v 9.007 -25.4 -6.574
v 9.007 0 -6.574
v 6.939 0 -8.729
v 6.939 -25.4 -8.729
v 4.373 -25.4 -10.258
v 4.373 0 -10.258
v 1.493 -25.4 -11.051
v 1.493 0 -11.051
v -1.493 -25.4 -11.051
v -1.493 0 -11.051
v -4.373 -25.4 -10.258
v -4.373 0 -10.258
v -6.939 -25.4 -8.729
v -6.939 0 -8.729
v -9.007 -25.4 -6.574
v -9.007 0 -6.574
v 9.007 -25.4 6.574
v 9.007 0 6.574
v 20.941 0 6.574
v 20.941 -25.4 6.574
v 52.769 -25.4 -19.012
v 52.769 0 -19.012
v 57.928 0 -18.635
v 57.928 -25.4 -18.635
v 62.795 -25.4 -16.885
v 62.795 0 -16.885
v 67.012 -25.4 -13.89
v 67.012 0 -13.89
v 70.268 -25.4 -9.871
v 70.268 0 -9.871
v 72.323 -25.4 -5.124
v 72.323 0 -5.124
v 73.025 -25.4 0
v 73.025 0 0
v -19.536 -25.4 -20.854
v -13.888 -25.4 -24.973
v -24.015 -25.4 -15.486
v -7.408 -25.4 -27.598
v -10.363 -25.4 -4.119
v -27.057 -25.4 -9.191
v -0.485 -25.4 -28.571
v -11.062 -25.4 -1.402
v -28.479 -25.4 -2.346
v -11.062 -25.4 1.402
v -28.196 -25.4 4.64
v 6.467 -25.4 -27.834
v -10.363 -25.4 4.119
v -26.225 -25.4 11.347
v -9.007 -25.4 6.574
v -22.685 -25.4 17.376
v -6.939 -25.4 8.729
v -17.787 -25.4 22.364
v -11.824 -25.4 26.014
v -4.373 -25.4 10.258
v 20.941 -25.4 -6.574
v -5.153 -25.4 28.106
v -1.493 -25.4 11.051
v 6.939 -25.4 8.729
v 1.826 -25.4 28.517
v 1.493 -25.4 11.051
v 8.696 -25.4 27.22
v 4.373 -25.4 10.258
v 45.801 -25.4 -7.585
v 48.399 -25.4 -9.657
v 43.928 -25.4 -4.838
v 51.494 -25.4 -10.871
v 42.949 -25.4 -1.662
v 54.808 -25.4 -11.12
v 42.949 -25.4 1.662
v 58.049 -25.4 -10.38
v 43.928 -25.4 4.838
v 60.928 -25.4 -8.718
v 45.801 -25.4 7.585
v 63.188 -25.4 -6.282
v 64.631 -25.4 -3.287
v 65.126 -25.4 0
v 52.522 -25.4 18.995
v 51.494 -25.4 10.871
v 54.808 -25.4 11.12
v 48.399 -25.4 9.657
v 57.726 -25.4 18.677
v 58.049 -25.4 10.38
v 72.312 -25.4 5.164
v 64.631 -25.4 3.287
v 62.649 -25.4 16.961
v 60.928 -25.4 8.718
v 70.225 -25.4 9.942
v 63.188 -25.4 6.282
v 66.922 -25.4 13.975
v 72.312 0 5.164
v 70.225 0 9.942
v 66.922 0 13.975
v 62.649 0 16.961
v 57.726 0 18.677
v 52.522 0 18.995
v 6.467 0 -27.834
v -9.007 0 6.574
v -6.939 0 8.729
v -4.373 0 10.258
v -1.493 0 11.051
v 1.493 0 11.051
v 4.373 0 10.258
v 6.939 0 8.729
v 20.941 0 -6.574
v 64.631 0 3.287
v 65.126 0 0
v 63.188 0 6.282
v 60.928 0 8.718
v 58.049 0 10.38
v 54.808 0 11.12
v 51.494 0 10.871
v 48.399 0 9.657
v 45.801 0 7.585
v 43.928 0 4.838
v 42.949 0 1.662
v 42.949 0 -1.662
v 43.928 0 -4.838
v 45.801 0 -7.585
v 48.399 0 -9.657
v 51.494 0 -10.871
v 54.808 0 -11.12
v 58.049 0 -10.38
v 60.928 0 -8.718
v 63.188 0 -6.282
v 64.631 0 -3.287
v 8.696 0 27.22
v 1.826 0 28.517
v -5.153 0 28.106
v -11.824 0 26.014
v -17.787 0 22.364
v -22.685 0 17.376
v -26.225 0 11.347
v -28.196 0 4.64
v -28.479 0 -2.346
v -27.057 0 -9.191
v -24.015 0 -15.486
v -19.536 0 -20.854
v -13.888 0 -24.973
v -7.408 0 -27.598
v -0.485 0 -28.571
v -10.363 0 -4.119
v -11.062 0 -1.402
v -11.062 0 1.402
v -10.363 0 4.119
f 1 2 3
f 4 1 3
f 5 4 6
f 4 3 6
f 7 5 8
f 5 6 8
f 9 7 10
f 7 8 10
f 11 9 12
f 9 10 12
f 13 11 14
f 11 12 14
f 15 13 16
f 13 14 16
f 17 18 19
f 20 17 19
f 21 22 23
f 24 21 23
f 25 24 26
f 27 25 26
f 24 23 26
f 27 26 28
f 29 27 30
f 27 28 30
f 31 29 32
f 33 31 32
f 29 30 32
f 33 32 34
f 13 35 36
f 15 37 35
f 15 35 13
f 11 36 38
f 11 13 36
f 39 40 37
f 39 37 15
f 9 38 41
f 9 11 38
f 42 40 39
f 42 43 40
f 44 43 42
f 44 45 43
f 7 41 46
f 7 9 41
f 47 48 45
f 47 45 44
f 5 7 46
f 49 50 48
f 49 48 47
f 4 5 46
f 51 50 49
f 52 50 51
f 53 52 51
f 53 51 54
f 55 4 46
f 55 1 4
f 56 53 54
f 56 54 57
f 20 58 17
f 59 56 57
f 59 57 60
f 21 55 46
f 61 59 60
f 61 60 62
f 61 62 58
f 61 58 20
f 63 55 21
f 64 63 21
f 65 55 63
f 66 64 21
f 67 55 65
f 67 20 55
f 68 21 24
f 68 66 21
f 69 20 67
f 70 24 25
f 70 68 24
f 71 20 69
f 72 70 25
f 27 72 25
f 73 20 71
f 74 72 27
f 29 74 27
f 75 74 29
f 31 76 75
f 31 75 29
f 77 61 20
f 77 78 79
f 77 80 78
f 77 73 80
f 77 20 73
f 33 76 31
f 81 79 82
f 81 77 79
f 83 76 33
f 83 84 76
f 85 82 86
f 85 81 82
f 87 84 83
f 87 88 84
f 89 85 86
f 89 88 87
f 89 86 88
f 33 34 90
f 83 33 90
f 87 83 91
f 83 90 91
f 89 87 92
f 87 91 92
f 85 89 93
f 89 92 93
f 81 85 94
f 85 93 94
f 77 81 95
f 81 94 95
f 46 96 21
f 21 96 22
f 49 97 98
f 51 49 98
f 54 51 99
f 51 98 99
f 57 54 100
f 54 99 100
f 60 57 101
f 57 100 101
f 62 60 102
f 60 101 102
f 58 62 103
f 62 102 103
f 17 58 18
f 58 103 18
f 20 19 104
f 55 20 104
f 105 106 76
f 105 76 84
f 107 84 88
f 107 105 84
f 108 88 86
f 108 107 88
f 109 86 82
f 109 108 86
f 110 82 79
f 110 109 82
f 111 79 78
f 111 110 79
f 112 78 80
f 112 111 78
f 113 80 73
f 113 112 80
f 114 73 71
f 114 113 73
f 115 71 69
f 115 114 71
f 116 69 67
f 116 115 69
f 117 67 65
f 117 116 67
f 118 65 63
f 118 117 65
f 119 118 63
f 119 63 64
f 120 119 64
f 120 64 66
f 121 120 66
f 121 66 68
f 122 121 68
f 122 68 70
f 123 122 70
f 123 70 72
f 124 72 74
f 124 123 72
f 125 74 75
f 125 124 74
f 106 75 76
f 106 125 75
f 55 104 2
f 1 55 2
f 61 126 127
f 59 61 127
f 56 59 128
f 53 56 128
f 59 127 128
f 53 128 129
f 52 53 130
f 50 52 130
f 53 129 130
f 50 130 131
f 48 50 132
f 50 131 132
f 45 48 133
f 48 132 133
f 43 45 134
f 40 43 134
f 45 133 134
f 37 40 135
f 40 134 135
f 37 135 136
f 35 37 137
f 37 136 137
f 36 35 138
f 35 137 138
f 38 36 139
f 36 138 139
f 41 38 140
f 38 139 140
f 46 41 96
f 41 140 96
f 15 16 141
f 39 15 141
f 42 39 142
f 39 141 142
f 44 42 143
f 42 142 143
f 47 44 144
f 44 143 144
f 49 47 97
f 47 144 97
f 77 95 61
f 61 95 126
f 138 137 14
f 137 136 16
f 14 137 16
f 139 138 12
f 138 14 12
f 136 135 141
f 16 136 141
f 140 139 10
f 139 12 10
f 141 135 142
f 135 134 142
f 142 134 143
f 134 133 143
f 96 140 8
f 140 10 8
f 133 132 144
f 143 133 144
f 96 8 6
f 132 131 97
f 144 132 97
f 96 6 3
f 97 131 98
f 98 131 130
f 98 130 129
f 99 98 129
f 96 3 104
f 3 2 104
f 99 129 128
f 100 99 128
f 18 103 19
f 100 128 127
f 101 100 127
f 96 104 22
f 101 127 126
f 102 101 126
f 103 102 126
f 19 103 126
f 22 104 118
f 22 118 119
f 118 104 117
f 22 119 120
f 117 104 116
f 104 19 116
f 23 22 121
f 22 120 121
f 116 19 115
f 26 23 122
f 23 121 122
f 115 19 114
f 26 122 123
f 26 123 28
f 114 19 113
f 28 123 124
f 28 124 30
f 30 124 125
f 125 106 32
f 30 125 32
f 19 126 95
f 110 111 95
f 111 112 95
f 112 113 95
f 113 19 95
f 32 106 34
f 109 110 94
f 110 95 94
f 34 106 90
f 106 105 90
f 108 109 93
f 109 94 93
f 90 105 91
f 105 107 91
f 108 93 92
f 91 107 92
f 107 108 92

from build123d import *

# Parameters (mm, degrees)
F0_R     = 11.151047
F1_DEPTH = 25.4


with BuildPart() as f1:
    # F0 (on Front) → F1 (new body)
    with BuildSketch(Plane.XZ):
        with BuildLine():
            ThreePointArc((6.467178, -27.833545), (22.375547, -17.772605), (28.575, 0))
            ThreePointArc((28.575, 0), (23.076019, 16.853129), (8.695527, 27.219817))
            ThreePointArc((8.695527, 27.219817), (-28.551621, 1.15566), (6.467178, -27.833545))
        make_face()
        with BuildLine():
            ThreePointArc((-9.006877, 6.574345), (0, 11.151047), (9.006877, 6.574345))
            Line((9.006877, 6.574345), (20.940501, 6.574345))
            Line((20.940501, 6.574345), (20.940501, -6.574345))
            Line((20.940501, -6.574345), (9.006877, -6.574345))
            ThreePointArc((9.006877, -6.574345), (0, -11.151047), (-9.006877, -6.574345))
            Line((-9.006877, -6.574345), (-20.940501, -6.574345))
            Line((-20.940501, -6.574345), (-20.940501, 6.574345))
            Line((-20.940501, 6.574345), (-9.006877, 6.574345))
        make_face(mode=Mode.SUBTRACT)
        with BuildLine():
            ThreePointArc((-9.006877, -6.574345), (-11.151047, 0), (-9.006877, 6.574345))
            Line((-9.006877, 6.574345), (-20.940501, 6.574345))
            Line((-20.940501, 6.574345), (-20.940501, -6.574345))
            Line((-20.940501, -6.574345), (-9.006877, -6.574345))
        make_face()
        with BuildLine():
            ThreePointArc((8.695527, 27.219817), (23.076019, 16.853129), (28.575, 0))
            ThreePointArc((28.575, 0), (22.375547, -17.772605), (6.467178, -27.833545))
            Line((6.467178, -27.833545), (52.769401, -19.011813))
            ThreePointArc((52.769401, -19.011813), (34.925403, -0.123852), (52.522301, 18.99453))
            Line((52.522301, 18.99453), (8.695527, 27.219817))
        make_face()
        with BuildLine():
            ThreePointArc((73.025, 0), (66.921594, 13.974556), (52.522301, 18.99453))
            ThreePointArc((52.522301, 18.99453), (34.925403, -0.123852), (52.769401, -19.011813))
            ThreePointArc((52.769401, -19.011813), (67.012174, -13.890089), (73.025, 0))
        make_face()
        with Locations((53.975, 0)):
            Circle(F0_R, mode=Mode.SUBTRACT)
    extrude(amount=F1_DEPTH)


solid = f1.part
